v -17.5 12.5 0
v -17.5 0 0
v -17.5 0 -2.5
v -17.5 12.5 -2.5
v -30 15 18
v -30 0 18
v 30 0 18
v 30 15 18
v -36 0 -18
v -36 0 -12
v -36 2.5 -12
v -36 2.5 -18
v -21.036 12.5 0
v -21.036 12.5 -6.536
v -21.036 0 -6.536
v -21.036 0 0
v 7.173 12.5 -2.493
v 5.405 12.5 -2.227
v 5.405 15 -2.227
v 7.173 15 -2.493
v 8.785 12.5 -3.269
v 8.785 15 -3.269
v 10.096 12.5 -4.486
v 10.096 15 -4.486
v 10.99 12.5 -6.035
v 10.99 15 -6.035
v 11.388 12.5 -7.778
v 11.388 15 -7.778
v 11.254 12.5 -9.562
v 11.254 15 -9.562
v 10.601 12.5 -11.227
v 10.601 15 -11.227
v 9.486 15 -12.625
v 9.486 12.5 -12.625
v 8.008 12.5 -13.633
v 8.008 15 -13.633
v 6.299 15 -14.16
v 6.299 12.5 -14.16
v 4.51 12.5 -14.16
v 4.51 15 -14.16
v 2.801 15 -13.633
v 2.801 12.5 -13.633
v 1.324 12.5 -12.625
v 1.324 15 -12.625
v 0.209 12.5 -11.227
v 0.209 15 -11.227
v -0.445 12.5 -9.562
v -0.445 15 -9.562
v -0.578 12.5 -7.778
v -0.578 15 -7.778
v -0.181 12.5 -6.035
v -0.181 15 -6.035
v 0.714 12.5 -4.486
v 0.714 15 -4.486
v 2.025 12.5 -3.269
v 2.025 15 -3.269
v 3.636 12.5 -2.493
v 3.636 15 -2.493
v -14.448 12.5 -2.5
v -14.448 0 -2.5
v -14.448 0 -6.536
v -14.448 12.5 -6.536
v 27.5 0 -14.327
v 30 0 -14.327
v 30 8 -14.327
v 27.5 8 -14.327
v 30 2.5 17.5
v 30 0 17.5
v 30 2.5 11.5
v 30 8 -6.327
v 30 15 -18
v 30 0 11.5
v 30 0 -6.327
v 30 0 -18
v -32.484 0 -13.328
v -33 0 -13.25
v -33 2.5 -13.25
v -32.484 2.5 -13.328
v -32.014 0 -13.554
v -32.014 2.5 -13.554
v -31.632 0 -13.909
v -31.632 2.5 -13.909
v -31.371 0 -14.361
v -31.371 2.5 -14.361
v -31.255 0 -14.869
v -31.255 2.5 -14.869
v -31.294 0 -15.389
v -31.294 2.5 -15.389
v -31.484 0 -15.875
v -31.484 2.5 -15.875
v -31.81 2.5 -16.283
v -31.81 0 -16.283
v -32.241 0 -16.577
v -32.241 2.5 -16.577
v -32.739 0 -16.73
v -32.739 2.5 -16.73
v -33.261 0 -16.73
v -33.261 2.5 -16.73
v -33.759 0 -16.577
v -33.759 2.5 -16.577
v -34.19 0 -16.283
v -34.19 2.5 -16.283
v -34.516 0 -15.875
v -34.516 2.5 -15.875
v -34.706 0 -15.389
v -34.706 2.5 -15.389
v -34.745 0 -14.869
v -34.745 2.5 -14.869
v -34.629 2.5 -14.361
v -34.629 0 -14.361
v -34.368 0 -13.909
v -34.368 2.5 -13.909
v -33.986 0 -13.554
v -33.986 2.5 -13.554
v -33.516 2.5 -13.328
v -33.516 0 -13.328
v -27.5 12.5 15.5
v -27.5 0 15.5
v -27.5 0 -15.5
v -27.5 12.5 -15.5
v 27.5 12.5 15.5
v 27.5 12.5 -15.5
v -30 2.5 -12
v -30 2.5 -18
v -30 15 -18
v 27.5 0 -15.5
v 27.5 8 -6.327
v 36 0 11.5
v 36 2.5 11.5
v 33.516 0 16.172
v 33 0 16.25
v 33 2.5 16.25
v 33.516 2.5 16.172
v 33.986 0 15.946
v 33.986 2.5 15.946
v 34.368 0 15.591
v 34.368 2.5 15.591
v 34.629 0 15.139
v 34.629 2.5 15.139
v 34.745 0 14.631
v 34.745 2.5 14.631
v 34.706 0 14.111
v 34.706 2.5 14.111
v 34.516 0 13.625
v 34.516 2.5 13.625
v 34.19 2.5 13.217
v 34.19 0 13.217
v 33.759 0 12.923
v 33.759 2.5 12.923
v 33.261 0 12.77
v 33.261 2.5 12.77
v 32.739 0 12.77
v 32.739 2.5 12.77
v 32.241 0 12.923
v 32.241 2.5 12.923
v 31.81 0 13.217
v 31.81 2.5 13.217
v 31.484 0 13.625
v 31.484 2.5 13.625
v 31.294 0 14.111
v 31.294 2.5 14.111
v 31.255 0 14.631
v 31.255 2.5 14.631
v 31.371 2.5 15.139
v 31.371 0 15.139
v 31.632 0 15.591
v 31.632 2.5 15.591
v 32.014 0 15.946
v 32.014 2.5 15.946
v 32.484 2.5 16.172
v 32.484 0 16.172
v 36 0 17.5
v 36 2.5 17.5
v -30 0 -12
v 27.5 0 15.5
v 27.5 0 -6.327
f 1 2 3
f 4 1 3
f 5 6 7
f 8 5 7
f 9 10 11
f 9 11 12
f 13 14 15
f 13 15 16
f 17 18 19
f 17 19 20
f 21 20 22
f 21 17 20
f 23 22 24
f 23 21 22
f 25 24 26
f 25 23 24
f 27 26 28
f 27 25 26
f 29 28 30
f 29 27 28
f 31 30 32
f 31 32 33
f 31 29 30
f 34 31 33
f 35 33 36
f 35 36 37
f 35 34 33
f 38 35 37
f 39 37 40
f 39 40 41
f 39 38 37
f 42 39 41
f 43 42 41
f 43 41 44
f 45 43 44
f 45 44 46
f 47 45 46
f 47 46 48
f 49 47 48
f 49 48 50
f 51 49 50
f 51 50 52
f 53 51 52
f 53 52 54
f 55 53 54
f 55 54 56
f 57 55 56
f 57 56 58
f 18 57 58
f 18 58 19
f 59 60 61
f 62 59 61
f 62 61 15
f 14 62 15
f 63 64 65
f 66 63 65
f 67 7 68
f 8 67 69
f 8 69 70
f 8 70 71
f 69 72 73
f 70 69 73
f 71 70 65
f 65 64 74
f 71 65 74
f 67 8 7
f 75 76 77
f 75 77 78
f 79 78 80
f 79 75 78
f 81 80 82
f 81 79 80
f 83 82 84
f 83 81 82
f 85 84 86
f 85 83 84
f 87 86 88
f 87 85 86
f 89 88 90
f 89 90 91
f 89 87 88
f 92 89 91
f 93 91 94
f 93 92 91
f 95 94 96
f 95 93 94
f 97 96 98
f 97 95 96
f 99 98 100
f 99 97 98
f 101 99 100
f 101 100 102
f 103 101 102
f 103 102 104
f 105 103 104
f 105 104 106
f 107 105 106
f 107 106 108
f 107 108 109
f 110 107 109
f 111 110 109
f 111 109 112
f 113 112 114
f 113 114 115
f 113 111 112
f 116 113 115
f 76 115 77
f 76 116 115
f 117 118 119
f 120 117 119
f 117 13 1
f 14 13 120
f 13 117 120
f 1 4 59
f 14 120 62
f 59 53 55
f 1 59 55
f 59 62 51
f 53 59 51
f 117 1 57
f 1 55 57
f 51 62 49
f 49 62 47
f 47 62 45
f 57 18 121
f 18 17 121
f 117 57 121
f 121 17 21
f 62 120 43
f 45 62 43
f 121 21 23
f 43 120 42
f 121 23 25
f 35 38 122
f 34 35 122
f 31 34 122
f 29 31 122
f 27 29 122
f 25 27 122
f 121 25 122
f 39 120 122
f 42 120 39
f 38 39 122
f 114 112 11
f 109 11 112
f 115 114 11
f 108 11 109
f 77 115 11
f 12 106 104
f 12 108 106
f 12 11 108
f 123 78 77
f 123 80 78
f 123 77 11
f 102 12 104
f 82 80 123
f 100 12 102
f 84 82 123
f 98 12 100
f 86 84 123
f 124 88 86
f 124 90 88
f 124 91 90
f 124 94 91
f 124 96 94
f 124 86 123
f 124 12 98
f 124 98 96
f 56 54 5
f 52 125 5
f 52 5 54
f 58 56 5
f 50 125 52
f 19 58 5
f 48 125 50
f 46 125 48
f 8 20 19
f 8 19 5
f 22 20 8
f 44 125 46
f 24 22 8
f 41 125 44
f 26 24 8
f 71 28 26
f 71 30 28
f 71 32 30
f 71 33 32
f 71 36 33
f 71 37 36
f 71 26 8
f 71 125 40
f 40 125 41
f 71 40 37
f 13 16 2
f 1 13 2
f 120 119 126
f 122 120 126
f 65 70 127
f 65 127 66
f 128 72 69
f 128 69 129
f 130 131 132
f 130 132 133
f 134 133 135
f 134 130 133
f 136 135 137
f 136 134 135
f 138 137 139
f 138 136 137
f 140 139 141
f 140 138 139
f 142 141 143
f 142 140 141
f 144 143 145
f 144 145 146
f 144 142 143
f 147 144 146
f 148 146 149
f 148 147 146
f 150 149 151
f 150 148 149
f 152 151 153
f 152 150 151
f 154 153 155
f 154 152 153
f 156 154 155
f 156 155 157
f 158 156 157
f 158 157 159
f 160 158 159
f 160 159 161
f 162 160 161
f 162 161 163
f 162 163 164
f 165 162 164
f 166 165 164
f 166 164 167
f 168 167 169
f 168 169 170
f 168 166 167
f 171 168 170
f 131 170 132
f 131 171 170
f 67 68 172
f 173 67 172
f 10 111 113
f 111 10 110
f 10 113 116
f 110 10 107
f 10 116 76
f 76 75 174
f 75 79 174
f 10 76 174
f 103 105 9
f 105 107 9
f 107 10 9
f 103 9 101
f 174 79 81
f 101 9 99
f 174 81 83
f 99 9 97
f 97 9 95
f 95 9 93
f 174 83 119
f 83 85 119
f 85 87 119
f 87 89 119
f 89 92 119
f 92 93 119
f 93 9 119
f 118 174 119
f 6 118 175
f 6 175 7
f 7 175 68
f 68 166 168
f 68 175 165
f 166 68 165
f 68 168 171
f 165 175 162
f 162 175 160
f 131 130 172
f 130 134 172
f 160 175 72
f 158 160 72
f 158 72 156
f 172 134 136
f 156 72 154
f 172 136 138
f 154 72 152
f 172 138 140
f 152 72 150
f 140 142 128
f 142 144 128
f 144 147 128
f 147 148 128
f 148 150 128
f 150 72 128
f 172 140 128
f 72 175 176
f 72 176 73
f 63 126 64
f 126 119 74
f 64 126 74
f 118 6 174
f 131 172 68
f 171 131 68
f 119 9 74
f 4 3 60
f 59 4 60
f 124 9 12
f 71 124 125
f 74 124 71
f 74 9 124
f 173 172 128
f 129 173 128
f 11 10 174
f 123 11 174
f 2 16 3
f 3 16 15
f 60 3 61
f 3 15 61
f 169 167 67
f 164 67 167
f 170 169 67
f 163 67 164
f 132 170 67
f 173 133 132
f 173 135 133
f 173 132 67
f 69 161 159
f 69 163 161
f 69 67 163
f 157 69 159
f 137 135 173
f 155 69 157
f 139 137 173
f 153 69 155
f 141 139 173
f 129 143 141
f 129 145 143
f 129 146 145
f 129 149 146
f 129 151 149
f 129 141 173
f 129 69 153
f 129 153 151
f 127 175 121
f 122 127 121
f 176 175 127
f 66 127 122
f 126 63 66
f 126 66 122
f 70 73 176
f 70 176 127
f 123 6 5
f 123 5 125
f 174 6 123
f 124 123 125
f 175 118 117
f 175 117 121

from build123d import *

# Parameters (mm, degrees)
SKETCH2_W           = 60
SKETCH2_H           = 36
BOSS_EXTRUDE2_DEPTH = 15
SKETCH5_W           = 55
SKETCH5_H           = 31
CUT_EXTRUDE1_DEPTH  = 12.5
SKETCH6_W           = 6
SKETCH6_H           = 6
SKETCH6_R           = 1.75
BOSS_EXTRUDE3_DEPTH = 2.5
SKETCH7_R           = 6
CUT_EXTRUDE2_DEPTH  = 15
BOSS_EXTRUDE4_DEPTH = 12.5
SKETCH10_W          = 8
SKETCH10_H          = 8
CUT_EXTRUDE3_DEPTH  = 12.5


with BuildPart() as part:
    # Sketch2 → Boss-Extrude2 (new body)
    with BuildSketch(Plane(origin=(0, 0, 0), x_dir=(1, 0, 0), z_dir=(0, 1, 0))):
        Rectangle(SKETCH2_W, SKETCH2_H)
    extrude(amount=BOSS_EXTRUDE2_DEPTH)

    # Sketch5 → Cut-Extrude1 (cut)
    with BuildSketch(Plane(origin=(0, 0, 0), x_dir=(1, 0, 0), z_dir=(0, 1, 0))):
        Rectangle(SKETCH5_W, SKETCH5_H)
    extrude(amount=CUT_EXTRUDE1_DEPTH, mode=Mode.SUBTRACT)

    # Sketch6 → Boss-Extrude3 (add)
    with BuildSketch(Plane(origin=(0, 0, 0), x_dir=(1, 0, 0), z_dir=(0, 1, 0))):
        with Locations((-33, 15)):
            Rectangle(SKETCH6_W, SKETCH6_H)
        with Locations(Location((-33, 15, 0), (0, 0, 270))):  # turned: the seam where the file's is
            Circle(SKETCH6_R, mode=Mode.SUBTRACT)
        with Locations((33, -14.5)):
            Rectangle(SKETCH6_W, SKETCH6_H)
        with Locations(Location((33, -14.5, 0), (0, 0, 270))):  # turned: the seam where the file's is
            Circle(SKETCH6_R, mode=Mode.SUBTRACT)
    extrude(amount=BOSS_EXTRUDE3_DEPTH)

    # Sketch7 → Cut-Extrude2 (cut)
    with BuildSketch(Plane(origin=(0, 0, 0), x_dir=(1, 0, 0), z_dir=(0, 1, 0))):
        with Locations(Location((5.404735112, 8.226712099, 0), (0, 0, 270))):  # turned: the seam where the file's is
            Circle(SKETCH7_R)
    extrude(amount=CUT_EXTRUDE2_DEPTH, mode=Mode.SUBTRACT)

    # Sketch8 → Boss-Extrude4 (add)
    with BuildSketch(Plane(origin=(0, 0, 0), x_dir=(1, 0, 0), z_dir=(0, 1, 0))):
        Polygon((-21.035533906, 0), (-17.5, 0), (-17.5, 2.5), (-14.447985549, 2.5), (-14.447985549, 6.535533906), (-21.035533906, 6.535533906), align=None)
    extrude(amount=BOSS_EXTRUDE4_DEPTH)

    # Sketch10 → Cut-Extrude3 (cut)
    with BuildSketch(Plane(origin=(30, 0, 0), x_dir=(0, 0, -1), z_dir=(1, 0, 0))):
        with Locations((10.327095022, 4)):
            Rectangle(SKETCH10_W, SKETCH10_H)
    extrude(amount=-CUT_EXTRUDE3_DEPTH, mode=Mode.SUBTRACT)


solid = part.part
